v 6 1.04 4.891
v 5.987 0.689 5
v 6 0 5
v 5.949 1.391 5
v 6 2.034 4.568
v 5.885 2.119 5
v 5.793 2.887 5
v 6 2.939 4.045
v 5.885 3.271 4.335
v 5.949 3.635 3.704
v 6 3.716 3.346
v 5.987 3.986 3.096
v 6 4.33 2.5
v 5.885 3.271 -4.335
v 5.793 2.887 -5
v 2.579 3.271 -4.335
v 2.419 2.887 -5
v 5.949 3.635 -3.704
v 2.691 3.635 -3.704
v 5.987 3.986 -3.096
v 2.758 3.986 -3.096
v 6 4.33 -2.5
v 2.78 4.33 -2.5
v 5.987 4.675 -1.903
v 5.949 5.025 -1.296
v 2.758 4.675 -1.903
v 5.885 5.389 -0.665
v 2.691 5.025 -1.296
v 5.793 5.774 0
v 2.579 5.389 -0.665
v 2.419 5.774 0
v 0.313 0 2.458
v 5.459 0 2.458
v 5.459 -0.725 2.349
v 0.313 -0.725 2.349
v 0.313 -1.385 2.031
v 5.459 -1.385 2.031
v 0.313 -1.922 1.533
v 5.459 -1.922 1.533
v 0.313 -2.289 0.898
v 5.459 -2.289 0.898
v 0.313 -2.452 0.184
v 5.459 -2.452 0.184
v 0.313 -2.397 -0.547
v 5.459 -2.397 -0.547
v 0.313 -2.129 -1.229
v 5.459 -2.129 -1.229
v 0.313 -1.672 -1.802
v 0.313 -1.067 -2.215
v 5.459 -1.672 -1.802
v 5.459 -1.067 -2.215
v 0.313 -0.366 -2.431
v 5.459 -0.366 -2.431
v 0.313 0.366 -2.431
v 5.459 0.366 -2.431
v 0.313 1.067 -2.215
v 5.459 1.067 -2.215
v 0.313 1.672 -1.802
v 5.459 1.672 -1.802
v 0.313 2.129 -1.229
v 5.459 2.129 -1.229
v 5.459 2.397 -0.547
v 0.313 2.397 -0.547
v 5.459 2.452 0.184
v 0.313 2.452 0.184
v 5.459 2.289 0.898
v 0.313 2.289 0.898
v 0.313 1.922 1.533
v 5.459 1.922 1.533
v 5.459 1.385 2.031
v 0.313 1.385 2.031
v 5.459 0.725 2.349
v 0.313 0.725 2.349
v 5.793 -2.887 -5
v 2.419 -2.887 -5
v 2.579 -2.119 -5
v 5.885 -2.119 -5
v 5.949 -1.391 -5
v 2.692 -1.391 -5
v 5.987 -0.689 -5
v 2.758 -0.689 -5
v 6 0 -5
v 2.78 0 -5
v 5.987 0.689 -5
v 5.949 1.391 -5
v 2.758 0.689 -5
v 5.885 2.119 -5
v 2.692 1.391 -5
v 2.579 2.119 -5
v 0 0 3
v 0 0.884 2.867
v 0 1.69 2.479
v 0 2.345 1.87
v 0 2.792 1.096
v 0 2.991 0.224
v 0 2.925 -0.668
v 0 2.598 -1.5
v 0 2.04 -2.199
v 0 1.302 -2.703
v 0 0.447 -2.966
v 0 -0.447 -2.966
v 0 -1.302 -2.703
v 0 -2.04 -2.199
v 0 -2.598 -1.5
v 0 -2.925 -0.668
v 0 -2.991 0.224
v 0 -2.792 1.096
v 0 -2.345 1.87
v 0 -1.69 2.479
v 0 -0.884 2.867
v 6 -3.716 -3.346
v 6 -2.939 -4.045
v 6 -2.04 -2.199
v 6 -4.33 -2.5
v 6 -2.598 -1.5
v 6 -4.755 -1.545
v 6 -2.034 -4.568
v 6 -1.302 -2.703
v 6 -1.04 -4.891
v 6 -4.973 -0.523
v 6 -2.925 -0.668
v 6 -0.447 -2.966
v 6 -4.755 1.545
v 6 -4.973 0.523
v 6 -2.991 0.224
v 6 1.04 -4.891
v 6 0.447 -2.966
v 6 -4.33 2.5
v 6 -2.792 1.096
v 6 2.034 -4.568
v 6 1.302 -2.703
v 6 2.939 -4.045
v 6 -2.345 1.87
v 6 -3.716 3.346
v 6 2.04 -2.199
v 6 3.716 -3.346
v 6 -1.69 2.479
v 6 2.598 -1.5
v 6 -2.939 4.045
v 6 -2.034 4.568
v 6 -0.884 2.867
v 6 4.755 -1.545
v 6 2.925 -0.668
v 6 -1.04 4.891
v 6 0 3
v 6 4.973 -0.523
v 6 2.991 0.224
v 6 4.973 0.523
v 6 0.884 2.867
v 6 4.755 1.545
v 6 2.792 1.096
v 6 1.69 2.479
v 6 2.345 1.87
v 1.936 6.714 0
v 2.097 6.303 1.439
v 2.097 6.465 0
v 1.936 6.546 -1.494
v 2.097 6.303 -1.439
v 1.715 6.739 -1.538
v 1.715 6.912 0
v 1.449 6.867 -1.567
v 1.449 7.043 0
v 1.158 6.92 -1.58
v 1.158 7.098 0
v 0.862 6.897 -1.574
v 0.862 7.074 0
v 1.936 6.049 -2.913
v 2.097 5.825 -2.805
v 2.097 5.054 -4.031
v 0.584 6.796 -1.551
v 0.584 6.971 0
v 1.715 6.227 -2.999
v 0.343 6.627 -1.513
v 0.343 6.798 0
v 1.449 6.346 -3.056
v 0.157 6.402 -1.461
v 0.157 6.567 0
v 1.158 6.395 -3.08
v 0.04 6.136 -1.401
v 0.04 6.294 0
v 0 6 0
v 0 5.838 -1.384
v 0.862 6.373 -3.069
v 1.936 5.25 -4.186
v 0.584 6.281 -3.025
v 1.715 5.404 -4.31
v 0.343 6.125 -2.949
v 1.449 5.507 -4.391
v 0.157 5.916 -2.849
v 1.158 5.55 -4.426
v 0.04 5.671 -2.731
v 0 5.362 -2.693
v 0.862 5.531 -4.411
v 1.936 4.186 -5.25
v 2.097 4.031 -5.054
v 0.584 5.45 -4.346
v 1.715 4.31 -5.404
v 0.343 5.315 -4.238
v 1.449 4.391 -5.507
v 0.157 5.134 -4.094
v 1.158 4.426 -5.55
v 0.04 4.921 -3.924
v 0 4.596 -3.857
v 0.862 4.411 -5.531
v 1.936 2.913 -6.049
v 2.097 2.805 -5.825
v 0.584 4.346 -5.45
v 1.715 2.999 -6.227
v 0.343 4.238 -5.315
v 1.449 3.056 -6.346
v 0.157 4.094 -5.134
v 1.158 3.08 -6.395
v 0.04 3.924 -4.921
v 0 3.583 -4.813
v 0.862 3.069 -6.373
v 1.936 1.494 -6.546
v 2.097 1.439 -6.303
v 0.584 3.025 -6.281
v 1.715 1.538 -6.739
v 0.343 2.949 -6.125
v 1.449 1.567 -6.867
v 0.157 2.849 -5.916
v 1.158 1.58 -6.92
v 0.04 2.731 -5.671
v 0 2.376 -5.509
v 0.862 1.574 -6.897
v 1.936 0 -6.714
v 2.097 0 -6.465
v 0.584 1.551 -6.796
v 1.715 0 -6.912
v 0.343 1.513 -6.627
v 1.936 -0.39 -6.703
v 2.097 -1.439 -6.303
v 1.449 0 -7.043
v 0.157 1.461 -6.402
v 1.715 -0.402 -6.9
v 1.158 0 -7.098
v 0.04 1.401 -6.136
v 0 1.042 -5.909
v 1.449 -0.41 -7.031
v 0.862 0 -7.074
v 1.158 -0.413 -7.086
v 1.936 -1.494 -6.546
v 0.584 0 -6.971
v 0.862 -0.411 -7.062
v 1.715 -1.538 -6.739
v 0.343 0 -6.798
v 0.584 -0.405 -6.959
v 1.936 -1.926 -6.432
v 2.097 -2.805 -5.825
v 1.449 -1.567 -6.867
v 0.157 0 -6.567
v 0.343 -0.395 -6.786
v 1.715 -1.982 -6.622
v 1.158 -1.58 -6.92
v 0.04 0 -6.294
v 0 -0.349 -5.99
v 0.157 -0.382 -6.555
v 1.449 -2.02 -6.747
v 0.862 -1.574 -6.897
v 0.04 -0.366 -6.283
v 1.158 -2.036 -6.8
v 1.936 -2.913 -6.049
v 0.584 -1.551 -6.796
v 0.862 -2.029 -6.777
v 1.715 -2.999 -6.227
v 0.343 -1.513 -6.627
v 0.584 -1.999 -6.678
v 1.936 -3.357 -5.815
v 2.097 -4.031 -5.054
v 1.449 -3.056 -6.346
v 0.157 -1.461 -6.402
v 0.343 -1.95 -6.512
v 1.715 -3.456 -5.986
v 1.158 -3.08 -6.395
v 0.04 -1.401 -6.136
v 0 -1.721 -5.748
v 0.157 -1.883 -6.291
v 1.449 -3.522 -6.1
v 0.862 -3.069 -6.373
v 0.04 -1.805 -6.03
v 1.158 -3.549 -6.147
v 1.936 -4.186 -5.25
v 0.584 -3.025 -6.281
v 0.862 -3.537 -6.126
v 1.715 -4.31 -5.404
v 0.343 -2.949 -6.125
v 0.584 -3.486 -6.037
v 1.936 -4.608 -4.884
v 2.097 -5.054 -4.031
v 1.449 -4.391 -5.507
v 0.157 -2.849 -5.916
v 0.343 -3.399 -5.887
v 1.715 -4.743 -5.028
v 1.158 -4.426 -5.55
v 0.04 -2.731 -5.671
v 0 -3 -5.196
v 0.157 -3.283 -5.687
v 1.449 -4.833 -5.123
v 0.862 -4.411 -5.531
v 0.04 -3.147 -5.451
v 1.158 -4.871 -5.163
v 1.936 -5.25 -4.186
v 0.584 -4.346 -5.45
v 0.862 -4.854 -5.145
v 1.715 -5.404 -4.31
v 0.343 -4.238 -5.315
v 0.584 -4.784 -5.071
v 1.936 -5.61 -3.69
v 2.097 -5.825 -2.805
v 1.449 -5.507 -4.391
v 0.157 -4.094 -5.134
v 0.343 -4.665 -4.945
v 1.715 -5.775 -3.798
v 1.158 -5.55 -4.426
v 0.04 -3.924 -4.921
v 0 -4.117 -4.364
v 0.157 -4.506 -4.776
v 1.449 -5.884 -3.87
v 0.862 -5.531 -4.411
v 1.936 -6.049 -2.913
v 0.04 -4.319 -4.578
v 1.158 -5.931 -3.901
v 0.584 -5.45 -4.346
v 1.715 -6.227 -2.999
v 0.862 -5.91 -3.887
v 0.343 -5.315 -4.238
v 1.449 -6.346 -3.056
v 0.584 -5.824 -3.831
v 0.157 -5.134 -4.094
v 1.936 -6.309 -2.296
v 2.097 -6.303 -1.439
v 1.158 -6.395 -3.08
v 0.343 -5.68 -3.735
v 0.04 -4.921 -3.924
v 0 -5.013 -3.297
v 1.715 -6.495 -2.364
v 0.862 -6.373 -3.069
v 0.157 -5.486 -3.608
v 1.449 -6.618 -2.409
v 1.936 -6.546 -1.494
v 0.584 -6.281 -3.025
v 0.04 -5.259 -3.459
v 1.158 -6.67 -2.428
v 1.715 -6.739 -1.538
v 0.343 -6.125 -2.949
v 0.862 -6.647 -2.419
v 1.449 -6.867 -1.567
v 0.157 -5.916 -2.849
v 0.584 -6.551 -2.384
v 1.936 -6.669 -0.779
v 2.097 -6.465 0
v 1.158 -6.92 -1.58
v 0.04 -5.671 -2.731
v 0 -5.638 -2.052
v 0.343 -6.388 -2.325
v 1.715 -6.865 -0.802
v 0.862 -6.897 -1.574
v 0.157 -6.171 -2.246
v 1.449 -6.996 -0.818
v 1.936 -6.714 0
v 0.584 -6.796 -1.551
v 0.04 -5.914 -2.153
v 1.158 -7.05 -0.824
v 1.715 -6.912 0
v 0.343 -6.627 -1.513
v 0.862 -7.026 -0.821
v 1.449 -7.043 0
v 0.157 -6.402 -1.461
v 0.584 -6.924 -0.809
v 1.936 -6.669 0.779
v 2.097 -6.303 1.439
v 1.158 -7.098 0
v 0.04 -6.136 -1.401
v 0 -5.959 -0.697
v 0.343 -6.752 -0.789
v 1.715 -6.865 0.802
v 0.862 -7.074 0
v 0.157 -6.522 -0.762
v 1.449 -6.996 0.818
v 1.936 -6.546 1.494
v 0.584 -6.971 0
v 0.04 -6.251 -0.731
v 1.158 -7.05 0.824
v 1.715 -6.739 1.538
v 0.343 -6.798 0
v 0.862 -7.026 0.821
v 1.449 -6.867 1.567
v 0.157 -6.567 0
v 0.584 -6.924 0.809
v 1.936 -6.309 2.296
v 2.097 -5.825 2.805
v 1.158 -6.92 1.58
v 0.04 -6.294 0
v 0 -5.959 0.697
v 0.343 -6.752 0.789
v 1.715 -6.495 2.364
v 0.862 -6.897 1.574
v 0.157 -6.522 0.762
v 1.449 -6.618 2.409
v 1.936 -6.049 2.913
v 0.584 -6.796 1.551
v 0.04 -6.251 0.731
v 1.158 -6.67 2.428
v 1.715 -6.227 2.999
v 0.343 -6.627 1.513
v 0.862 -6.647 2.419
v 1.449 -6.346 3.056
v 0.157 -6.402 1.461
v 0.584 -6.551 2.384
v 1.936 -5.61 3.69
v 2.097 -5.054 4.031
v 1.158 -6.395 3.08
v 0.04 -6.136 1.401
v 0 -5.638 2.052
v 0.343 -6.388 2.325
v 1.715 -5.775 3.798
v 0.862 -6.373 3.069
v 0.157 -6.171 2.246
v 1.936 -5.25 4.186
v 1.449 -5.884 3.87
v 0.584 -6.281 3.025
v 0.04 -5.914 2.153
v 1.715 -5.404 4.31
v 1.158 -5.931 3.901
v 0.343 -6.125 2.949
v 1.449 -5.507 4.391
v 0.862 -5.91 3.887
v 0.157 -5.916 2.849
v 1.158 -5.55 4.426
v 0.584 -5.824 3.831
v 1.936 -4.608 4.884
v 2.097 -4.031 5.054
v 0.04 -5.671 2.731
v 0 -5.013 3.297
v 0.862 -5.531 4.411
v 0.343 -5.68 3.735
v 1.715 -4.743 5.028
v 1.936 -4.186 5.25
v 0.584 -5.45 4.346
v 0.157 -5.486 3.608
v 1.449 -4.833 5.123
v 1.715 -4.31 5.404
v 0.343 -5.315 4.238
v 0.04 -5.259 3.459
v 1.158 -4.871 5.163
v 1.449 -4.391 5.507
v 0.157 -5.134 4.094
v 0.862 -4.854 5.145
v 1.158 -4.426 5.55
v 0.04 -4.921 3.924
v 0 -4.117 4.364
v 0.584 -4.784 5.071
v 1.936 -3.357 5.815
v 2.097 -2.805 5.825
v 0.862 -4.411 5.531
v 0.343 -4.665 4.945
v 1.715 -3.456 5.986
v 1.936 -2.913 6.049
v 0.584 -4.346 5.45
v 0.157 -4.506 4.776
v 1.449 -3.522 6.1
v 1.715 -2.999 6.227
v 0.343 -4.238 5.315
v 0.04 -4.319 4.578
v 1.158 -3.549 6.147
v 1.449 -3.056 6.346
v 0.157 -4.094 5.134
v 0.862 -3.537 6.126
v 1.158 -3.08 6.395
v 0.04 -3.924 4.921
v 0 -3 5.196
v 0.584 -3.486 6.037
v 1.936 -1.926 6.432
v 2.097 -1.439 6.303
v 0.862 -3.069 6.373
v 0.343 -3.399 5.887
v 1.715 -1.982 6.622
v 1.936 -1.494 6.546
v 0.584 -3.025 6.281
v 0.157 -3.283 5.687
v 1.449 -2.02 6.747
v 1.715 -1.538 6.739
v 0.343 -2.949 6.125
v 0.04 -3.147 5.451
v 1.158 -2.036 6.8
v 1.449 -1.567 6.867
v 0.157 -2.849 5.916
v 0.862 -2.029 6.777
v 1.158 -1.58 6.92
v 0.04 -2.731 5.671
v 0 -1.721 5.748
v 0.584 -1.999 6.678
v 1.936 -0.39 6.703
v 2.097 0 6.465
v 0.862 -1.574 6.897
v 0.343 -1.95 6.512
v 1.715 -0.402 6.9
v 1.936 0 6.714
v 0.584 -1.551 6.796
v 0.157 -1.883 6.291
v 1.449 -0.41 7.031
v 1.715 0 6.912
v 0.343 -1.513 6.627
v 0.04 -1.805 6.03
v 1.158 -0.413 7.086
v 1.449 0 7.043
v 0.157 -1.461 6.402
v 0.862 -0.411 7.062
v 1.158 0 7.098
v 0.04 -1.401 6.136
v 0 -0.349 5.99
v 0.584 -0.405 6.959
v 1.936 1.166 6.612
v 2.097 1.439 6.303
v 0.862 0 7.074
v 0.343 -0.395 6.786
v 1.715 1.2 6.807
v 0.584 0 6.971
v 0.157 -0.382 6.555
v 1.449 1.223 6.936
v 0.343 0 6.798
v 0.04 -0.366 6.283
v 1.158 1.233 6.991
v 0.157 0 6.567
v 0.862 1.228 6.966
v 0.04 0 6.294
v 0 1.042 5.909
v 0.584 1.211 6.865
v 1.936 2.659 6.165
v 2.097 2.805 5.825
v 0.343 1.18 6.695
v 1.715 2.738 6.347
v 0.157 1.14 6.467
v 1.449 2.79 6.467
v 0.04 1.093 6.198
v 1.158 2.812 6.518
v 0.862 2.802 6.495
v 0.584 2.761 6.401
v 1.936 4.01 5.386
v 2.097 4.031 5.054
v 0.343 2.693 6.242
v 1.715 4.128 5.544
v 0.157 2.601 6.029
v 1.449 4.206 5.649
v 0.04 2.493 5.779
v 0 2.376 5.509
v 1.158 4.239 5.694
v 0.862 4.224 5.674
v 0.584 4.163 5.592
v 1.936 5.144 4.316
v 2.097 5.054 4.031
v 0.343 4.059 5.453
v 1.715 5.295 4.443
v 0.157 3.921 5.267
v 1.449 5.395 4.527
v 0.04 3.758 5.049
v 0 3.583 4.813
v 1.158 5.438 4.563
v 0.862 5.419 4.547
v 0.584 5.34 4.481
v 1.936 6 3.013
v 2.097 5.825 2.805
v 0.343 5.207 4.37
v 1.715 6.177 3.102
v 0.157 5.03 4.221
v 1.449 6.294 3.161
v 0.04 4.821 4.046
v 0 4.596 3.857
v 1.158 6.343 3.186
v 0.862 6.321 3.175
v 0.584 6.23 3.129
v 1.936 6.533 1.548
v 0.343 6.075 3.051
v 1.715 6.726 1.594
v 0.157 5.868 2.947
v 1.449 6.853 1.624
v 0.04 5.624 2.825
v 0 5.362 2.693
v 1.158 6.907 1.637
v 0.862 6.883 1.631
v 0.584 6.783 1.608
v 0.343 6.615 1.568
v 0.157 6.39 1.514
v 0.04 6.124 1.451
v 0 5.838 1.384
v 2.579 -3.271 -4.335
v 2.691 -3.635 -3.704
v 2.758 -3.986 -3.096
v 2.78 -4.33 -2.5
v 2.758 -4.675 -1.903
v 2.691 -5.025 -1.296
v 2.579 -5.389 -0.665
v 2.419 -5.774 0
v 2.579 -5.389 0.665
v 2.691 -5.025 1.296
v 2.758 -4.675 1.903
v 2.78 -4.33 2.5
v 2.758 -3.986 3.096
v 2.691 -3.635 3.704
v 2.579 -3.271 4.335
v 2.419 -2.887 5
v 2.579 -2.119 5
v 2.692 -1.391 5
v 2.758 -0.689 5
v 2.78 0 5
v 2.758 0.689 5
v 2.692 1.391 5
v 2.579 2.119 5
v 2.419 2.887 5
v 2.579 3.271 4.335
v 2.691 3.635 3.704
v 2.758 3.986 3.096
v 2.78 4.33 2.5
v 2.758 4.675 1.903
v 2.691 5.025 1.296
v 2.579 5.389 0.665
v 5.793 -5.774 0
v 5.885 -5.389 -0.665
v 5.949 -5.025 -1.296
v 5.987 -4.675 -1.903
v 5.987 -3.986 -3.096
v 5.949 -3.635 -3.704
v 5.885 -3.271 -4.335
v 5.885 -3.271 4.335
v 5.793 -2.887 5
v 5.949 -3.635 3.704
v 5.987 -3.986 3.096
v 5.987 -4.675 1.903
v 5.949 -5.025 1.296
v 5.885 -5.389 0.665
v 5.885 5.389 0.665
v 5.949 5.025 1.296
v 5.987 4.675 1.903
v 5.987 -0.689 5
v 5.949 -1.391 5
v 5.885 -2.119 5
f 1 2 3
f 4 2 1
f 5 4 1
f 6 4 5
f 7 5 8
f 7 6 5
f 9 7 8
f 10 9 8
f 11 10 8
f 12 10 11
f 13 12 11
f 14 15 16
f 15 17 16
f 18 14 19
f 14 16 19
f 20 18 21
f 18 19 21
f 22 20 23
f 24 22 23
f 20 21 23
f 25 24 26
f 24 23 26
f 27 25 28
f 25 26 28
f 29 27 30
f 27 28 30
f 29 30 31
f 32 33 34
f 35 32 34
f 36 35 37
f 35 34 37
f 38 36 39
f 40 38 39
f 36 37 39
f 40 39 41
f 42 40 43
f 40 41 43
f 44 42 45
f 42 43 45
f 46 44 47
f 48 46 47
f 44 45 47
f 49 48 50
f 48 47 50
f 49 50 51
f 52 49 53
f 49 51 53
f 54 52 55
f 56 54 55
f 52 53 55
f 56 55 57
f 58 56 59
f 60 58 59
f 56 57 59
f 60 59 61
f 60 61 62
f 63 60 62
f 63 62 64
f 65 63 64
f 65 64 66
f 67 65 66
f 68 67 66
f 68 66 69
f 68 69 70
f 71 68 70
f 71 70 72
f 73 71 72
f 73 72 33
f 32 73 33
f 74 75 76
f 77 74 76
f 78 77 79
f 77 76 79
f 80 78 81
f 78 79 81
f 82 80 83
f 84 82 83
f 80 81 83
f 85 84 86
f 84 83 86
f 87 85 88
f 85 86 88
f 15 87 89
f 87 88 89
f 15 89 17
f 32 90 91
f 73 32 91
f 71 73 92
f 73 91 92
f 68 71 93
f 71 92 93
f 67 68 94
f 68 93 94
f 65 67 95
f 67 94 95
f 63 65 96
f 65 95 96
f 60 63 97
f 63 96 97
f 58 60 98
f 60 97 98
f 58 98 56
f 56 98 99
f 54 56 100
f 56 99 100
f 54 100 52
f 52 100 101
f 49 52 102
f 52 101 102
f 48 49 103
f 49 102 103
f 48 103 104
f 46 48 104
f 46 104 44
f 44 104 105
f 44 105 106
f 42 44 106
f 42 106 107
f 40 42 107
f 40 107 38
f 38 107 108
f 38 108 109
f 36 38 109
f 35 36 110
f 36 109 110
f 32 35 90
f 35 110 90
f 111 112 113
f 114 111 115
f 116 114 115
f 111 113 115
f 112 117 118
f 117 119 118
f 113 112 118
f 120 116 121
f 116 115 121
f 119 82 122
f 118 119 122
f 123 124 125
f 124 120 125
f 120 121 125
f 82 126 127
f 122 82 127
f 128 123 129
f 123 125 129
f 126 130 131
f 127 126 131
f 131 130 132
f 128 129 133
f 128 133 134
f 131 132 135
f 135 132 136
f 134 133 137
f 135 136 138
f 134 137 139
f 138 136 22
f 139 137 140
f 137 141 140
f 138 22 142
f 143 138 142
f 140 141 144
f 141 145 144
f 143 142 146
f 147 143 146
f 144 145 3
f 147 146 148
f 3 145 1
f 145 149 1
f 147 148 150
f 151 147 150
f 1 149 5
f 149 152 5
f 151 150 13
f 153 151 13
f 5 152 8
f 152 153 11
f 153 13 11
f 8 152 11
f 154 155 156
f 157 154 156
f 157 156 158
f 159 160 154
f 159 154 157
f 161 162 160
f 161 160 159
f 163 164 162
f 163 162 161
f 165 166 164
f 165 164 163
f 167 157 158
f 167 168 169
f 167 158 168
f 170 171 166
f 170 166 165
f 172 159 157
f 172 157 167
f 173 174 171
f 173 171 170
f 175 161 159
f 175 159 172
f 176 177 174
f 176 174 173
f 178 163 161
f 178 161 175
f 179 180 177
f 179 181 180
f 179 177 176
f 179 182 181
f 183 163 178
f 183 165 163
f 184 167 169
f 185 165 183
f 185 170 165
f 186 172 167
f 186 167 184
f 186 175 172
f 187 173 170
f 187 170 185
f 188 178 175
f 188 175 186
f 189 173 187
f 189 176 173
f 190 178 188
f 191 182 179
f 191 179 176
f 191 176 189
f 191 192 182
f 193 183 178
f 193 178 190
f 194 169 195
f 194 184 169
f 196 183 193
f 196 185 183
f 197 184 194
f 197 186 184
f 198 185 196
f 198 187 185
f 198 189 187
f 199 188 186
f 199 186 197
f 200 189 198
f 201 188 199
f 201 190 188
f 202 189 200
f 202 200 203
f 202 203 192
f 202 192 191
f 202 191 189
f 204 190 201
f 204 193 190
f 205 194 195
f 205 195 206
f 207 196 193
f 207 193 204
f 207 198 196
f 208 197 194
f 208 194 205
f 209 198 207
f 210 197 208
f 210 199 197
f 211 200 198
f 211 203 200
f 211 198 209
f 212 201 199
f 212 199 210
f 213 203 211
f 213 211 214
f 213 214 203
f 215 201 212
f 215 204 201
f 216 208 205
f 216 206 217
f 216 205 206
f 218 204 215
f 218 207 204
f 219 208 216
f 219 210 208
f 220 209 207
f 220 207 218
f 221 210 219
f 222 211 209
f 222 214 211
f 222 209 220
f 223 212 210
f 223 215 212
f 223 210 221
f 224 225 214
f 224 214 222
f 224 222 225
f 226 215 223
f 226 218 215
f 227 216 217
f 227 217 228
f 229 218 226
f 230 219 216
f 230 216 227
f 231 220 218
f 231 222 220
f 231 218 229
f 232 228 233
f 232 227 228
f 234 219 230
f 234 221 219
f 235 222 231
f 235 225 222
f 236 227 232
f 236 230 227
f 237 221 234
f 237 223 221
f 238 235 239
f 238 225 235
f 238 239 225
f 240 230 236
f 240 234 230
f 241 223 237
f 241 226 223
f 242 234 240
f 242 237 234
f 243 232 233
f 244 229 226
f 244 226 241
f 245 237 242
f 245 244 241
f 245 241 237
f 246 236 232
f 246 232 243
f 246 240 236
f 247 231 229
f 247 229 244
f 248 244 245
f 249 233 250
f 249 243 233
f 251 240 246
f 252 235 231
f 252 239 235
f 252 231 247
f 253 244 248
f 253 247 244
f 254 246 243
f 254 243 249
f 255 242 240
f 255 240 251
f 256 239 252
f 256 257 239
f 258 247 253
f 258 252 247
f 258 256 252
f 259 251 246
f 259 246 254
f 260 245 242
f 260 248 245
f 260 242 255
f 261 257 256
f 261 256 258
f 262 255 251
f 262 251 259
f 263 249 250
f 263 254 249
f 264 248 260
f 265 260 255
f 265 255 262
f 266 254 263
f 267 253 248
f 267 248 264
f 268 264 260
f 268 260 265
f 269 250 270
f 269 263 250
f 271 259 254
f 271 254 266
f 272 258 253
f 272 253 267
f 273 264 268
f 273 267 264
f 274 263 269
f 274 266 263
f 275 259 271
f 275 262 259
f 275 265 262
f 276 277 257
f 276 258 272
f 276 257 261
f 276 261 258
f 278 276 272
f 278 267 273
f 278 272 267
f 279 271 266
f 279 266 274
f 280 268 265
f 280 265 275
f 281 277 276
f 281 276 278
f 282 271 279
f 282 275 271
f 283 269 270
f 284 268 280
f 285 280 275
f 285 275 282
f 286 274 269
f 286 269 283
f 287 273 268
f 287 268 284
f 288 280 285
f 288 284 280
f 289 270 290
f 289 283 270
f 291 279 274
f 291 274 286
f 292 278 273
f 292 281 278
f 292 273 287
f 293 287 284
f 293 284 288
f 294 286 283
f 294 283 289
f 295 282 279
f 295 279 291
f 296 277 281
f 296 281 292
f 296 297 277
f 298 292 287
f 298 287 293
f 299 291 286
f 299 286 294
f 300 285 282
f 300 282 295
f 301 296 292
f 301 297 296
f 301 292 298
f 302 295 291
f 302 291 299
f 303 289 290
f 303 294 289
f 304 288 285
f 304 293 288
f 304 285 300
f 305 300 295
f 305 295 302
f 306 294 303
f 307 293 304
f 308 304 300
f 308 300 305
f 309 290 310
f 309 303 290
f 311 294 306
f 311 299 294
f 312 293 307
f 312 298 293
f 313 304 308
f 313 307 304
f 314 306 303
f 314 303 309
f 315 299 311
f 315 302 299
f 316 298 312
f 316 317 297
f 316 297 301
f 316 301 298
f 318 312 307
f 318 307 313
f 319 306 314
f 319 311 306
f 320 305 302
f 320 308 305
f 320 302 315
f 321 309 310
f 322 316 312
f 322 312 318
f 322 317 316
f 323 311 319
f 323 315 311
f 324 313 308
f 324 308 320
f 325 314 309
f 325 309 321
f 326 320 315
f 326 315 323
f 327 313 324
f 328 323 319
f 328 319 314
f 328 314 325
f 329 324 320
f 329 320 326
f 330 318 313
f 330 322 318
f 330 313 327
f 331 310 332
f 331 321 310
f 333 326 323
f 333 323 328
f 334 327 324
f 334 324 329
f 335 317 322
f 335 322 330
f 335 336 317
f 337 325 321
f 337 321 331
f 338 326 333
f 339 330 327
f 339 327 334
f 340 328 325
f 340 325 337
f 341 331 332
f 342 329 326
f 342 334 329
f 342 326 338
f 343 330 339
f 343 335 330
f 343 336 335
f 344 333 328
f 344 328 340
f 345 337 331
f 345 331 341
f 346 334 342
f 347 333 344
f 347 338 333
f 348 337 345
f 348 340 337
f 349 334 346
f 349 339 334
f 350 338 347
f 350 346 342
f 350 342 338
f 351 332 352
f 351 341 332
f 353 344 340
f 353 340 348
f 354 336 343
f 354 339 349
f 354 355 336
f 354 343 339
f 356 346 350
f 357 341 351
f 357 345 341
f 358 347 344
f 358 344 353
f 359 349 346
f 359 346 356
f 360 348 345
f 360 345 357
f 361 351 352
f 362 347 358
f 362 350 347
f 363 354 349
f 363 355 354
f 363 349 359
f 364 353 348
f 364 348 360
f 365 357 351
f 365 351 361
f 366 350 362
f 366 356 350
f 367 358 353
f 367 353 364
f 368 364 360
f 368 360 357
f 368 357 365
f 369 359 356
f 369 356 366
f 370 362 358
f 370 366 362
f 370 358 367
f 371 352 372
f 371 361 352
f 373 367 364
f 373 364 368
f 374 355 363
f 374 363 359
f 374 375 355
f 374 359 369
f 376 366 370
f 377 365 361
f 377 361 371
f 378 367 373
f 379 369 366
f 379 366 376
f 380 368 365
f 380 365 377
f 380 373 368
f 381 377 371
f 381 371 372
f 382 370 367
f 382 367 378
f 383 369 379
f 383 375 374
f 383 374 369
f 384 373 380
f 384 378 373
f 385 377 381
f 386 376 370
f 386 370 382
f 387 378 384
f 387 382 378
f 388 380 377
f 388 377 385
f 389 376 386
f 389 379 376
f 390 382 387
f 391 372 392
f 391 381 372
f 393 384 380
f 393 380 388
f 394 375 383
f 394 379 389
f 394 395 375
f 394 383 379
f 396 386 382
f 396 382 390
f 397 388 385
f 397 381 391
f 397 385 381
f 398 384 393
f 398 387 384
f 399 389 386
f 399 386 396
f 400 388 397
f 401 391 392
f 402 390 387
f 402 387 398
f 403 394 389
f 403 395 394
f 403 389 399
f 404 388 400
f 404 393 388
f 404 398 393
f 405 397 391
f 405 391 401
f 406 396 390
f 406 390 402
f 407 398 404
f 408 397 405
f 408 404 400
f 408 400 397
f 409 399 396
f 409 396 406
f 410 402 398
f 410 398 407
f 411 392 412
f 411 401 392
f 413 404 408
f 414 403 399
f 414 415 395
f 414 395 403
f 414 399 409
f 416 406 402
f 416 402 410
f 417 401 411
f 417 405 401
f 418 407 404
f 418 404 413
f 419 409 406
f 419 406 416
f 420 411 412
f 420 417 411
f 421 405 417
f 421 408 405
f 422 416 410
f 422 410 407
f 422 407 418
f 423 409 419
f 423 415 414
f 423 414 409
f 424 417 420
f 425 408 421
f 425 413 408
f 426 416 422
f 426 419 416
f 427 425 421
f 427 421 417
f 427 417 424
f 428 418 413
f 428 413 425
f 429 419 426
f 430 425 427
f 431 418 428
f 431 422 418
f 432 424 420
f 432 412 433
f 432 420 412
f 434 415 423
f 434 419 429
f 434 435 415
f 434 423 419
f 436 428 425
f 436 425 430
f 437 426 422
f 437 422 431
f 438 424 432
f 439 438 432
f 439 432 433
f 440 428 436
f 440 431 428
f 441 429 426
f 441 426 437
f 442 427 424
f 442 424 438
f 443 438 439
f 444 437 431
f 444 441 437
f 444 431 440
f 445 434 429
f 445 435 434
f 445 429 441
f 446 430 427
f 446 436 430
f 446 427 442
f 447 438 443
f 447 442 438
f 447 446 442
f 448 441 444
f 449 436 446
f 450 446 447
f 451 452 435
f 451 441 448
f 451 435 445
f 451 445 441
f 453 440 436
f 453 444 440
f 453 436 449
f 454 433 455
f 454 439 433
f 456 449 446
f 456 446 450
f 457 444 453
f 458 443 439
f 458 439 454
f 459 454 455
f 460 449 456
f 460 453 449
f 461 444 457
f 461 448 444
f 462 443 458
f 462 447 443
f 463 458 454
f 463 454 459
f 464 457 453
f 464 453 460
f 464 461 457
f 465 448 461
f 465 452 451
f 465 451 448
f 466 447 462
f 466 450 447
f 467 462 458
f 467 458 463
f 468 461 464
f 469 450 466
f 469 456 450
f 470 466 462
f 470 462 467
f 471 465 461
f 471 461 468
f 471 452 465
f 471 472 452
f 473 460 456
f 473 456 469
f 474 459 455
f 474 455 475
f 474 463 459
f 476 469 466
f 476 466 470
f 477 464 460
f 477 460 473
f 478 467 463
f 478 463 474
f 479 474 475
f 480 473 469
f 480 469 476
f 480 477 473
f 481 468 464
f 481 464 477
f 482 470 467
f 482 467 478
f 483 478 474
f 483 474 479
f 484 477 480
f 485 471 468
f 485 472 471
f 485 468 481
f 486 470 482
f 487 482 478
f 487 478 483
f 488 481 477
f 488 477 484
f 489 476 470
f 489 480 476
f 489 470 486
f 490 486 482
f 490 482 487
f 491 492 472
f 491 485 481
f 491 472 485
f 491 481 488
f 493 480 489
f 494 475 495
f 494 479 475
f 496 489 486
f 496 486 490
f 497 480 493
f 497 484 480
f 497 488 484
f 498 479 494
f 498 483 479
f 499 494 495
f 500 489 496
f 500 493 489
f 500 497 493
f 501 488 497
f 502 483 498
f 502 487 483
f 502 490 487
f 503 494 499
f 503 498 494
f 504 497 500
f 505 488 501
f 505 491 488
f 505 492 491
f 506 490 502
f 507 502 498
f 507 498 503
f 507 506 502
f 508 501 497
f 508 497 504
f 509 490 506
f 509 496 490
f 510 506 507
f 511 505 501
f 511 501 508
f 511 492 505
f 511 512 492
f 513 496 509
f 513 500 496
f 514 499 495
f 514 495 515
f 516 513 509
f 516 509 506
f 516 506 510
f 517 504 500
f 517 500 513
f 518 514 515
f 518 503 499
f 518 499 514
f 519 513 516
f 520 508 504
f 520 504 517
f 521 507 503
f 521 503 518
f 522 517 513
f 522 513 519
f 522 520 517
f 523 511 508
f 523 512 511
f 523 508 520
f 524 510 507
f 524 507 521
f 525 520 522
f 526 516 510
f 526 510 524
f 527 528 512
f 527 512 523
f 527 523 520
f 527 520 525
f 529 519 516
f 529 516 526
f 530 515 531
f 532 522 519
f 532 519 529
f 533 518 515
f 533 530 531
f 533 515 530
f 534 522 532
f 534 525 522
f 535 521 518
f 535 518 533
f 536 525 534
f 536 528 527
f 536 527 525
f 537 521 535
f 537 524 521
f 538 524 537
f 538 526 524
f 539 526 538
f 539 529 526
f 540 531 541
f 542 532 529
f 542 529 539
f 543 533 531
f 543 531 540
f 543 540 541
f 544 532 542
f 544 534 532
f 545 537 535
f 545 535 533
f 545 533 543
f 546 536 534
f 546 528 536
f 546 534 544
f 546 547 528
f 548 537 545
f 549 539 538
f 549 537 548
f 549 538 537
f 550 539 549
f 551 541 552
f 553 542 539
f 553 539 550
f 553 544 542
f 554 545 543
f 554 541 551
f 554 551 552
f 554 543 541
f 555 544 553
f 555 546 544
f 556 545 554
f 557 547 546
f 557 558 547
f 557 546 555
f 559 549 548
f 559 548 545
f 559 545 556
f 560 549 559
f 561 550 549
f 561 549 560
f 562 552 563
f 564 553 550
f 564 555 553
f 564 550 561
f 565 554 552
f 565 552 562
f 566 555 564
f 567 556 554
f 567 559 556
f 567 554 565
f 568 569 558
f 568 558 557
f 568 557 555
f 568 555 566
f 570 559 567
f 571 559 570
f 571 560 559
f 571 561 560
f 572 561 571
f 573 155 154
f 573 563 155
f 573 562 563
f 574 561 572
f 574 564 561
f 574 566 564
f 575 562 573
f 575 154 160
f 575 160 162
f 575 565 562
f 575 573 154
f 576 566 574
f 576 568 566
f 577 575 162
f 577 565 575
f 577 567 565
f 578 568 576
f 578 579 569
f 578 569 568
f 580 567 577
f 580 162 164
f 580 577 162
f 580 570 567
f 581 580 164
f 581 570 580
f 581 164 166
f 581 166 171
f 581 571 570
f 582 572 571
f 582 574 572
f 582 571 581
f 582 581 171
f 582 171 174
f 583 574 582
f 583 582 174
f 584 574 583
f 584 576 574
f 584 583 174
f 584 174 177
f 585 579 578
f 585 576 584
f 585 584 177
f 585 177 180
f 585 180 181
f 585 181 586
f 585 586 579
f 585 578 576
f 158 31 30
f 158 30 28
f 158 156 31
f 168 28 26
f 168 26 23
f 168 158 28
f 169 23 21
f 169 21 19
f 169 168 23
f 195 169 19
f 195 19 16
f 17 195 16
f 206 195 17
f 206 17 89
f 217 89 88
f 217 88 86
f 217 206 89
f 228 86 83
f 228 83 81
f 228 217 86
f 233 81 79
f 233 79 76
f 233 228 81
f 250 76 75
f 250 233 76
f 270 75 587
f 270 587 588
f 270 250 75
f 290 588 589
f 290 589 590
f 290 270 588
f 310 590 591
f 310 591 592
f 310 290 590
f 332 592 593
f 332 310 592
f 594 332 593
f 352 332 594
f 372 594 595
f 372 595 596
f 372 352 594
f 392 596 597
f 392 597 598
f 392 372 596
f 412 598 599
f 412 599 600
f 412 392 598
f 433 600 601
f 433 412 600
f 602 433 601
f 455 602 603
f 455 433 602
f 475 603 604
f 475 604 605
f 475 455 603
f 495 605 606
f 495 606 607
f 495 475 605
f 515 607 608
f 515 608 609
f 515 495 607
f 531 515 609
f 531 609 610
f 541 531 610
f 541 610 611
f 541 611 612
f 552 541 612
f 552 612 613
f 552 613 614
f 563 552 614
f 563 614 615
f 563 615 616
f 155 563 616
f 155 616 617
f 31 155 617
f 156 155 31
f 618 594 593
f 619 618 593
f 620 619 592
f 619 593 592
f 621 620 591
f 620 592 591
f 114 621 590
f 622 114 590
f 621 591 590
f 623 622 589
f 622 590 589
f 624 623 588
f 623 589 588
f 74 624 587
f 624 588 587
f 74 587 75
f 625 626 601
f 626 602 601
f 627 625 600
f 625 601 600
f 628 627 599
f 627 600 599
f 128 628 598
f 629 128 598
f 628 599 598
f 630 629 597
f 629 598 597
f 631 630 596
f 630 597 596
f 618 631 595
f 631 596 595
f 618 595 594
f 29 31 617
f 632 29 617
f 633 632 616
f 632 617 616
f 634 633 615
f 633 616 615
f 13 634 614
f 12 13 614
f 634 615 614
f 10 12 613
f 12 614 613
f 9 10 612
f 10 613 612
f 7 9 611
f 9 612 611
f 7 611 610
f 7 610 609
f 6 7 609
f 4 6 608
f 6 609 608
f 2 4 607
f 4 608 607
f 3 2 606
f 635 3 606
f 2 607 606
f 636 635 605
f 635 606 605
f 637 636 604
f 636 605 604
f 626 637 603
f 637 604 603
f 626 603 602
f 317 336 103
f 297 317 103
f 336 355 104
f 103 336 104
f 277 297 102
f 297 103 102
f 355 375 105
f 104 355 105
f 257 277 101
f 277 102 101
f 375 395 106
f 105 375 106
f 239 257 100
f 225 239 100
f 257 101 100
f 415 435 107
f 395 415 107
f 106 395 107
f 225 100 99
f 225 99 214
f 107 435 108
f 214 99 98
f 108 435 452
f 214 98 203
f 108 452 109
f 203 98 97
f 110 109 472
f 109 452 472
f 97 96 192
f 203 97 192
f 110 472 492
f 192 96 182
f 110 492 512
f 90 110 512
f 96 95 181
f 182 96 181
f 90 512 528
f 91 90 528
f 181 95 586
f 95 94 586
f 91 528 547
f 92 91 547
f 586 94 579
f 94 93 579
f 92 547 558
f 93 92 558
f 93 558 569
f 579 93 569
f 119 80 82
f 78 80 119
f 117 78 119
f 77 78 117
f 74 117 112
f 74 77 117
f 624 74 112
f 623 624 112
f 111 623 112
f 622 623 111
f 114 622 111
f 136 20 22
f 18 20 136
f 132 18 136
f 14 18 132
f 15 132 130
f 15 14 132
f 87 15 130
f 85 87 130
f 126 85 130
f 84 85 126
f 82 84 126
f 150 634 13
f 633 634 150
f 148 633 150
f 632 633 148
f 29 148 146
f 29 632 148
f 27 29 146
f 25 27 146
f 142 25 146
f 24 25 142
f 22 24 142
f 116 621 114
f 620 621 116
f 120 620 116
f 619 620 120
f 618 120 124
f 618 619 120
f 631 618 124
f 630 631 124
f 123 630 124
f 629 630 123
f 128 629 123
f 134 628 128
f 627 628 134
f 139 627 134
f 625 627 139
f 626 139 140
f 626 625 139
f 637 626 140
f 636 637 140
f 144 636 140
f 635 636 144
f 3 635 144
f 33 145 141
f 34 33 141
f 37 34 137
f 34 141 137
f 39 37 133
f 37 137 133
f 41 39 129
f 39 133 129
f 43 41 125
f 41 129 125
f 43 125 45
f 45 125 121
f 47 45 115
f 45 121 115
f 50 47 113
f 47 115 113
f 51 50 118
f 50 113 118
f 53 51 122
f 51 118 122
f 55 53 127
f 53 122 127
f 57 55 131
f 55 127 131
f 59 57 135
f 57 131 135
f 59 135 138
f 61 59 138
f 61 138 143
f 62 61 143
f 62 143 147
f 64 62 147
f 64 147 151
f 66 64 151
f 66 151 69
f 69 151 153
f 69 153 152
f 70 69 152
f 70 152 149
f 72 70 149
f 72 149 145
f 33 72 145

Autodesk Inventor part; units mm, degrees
ref_plane "YZ Plane" through (0, 0, 0) normal (1, 0, 0) x (0, 1, 0)
ref_plane "XZ Plane" through (0, 0, 0) normal (0, 1, 0) x (-1, 0, 0)
sketch "Sketch1" plane through (0, 0, 0) normal (0, 0, 1) x (1, 0, 0)
  line L0 (-1.4239, 0) -> (7.2373, 0) projected
  line L1 (2.78, 5) -> (2.0969, 6.4649)
  line L2 (2.78, 5) -> (6, 5) construction
  line L3 (6, 5) -> (6, 0) construction
  arc A0 (2.0969, 6.4649) -> (0, 6) centre (1.1, 6) ccw
  line L4 (2.78, 5) -> (2.78, 0)
  line L5 (0, -1.4613) -> (0, 8.7676) projected
  point P0 (0, 0)
  dimension "d2" = 10
  dimension "d4" = 14.2
  dimension "d5" = 1.1
  dimension "d15" = 6
  dimension "d16" = 25
revolve "Ring" add sketch "Sketch1" angle 360 about axis through (-10, 0, 0) along (1, 0, 0)
sketch "Sketch2" plane through (0, 0, 0) normal (-1, 0, 0) x (0, 0, 1)
  circle A0 centre (0, 0) radius 4.9
  line L0 (-5, -2.8868) -> (-5, 2.8868)
  line L1 (-5, 2.8868) -> (0, 5.7735)
  line L2 (0, 5.7735) -> (5, 2.8868)
  line L3 (5, 2.8868) -> (5, -2.8868)
  line L4 (5, -2.8868) -> (0, -5.7735)
  line L5 (0, -5.7735) -> (-5, -2.8868)
  circle A1 centre (0, 0) radius 6 projected
  dimension "d6" = 11.547
extrude "Body" add sketch "Sketch2" against normal blind 6 contours A0 | L0 L1 L2 L3 L4 L5
sketch "Sketch3" plane through (0, 0, 0) normal (0, 0, 1) x (1, 0, 0)
  line L0 (2.4193, 5.7735) -> (6, 5.7735) projected
  line L1 (6, 2.8868) -> (6, 5.7735) projected
  line L2 (0, -6) -> (0, 6) projected
  line L3 (-1.2, 0) -> (7.2, 0) projected
  line L4 (5.7927, 5.7735) -> (6, 5)
  dimension "d10" = 15
  dimension "d11" = 10
revolve "Chamfer1" cut sketch "Sketch3" angle 360 about axis through (-10, 0, 0) along (1, 0, 0)
sketch "Sketch4" plane through (0, 0, 0) normal (-1, 0, 0) x (0, 0, 1)
  circle A0 centre (0, 0) radius 6 projected
hole "Thread" at (0, 0, 0) direction (1, 0, 0) diameter 4.917 end through all thread size "M6x1" class "6H" standard "ISO Metric profile"
chamfer "Chamfer2" distance 0.5413 angle 30 1 edges at (0, 0, -2.4585) measured on face at (0, 4.7554, -0.5774)
ref_plane "Work Plane1" through (20.959, 0, 0) normal (0, 0, -1) x (-1, 0, 0)
chamfer "Chamfer3" distance 0.5413 angle 45 1 edges at (6, 0, -2.4585)
equation "\"d2\" = SW"
equation "\"d4\" = LADI"
equation "\"d5\" = PHH"
equation "\"d15\" = KOH"
equation "\"d16\" = KEWI"
equation "\"d6\" = 1.1547 * SW"
equation "\"d7\" = KOH"
equation "\"d10\" = ANG1"
equation "\"d11\" = SW0"
equation "\"d12\" = -0.5 * GD1 + 0.5 * NND"
equation "\"d46\" = -0.5 * GD1 + 0.5 * NND"
equation "\"d51\" = -0.5 * GD1 + 0.5 * NND"
equation "\"ANG1\" = 15deg"
equation "\"KEWI\" = 25deg"
equation "\"NND\" = 6"
equation "\"LADI\" = 14.2"
equation "\"SW\" = 10"
equation "\"PHH\" = RR"
equation "\"KOH\" = NND"
equation "\"SW0\" = SW"
equation "\"d1\" = LADI"
equation "\"d3\" = PHH"
equation "\"GUL\" = 0.541266 * PTC"
equation "\"RR\" = 1.1"
equation "\"THREADDIA\" = 6"
equation "\"TOA\" = 30deg"
equation "\"PTC\" = 1"
equation "\"GAL\" = 0.541266 * PTC"
equation "\"E0\" = 1.155 * SW"
equation "\"GD1\" = 4.917468"
properties part number "DIN 6923 - M6" material "Steel, Mild"
